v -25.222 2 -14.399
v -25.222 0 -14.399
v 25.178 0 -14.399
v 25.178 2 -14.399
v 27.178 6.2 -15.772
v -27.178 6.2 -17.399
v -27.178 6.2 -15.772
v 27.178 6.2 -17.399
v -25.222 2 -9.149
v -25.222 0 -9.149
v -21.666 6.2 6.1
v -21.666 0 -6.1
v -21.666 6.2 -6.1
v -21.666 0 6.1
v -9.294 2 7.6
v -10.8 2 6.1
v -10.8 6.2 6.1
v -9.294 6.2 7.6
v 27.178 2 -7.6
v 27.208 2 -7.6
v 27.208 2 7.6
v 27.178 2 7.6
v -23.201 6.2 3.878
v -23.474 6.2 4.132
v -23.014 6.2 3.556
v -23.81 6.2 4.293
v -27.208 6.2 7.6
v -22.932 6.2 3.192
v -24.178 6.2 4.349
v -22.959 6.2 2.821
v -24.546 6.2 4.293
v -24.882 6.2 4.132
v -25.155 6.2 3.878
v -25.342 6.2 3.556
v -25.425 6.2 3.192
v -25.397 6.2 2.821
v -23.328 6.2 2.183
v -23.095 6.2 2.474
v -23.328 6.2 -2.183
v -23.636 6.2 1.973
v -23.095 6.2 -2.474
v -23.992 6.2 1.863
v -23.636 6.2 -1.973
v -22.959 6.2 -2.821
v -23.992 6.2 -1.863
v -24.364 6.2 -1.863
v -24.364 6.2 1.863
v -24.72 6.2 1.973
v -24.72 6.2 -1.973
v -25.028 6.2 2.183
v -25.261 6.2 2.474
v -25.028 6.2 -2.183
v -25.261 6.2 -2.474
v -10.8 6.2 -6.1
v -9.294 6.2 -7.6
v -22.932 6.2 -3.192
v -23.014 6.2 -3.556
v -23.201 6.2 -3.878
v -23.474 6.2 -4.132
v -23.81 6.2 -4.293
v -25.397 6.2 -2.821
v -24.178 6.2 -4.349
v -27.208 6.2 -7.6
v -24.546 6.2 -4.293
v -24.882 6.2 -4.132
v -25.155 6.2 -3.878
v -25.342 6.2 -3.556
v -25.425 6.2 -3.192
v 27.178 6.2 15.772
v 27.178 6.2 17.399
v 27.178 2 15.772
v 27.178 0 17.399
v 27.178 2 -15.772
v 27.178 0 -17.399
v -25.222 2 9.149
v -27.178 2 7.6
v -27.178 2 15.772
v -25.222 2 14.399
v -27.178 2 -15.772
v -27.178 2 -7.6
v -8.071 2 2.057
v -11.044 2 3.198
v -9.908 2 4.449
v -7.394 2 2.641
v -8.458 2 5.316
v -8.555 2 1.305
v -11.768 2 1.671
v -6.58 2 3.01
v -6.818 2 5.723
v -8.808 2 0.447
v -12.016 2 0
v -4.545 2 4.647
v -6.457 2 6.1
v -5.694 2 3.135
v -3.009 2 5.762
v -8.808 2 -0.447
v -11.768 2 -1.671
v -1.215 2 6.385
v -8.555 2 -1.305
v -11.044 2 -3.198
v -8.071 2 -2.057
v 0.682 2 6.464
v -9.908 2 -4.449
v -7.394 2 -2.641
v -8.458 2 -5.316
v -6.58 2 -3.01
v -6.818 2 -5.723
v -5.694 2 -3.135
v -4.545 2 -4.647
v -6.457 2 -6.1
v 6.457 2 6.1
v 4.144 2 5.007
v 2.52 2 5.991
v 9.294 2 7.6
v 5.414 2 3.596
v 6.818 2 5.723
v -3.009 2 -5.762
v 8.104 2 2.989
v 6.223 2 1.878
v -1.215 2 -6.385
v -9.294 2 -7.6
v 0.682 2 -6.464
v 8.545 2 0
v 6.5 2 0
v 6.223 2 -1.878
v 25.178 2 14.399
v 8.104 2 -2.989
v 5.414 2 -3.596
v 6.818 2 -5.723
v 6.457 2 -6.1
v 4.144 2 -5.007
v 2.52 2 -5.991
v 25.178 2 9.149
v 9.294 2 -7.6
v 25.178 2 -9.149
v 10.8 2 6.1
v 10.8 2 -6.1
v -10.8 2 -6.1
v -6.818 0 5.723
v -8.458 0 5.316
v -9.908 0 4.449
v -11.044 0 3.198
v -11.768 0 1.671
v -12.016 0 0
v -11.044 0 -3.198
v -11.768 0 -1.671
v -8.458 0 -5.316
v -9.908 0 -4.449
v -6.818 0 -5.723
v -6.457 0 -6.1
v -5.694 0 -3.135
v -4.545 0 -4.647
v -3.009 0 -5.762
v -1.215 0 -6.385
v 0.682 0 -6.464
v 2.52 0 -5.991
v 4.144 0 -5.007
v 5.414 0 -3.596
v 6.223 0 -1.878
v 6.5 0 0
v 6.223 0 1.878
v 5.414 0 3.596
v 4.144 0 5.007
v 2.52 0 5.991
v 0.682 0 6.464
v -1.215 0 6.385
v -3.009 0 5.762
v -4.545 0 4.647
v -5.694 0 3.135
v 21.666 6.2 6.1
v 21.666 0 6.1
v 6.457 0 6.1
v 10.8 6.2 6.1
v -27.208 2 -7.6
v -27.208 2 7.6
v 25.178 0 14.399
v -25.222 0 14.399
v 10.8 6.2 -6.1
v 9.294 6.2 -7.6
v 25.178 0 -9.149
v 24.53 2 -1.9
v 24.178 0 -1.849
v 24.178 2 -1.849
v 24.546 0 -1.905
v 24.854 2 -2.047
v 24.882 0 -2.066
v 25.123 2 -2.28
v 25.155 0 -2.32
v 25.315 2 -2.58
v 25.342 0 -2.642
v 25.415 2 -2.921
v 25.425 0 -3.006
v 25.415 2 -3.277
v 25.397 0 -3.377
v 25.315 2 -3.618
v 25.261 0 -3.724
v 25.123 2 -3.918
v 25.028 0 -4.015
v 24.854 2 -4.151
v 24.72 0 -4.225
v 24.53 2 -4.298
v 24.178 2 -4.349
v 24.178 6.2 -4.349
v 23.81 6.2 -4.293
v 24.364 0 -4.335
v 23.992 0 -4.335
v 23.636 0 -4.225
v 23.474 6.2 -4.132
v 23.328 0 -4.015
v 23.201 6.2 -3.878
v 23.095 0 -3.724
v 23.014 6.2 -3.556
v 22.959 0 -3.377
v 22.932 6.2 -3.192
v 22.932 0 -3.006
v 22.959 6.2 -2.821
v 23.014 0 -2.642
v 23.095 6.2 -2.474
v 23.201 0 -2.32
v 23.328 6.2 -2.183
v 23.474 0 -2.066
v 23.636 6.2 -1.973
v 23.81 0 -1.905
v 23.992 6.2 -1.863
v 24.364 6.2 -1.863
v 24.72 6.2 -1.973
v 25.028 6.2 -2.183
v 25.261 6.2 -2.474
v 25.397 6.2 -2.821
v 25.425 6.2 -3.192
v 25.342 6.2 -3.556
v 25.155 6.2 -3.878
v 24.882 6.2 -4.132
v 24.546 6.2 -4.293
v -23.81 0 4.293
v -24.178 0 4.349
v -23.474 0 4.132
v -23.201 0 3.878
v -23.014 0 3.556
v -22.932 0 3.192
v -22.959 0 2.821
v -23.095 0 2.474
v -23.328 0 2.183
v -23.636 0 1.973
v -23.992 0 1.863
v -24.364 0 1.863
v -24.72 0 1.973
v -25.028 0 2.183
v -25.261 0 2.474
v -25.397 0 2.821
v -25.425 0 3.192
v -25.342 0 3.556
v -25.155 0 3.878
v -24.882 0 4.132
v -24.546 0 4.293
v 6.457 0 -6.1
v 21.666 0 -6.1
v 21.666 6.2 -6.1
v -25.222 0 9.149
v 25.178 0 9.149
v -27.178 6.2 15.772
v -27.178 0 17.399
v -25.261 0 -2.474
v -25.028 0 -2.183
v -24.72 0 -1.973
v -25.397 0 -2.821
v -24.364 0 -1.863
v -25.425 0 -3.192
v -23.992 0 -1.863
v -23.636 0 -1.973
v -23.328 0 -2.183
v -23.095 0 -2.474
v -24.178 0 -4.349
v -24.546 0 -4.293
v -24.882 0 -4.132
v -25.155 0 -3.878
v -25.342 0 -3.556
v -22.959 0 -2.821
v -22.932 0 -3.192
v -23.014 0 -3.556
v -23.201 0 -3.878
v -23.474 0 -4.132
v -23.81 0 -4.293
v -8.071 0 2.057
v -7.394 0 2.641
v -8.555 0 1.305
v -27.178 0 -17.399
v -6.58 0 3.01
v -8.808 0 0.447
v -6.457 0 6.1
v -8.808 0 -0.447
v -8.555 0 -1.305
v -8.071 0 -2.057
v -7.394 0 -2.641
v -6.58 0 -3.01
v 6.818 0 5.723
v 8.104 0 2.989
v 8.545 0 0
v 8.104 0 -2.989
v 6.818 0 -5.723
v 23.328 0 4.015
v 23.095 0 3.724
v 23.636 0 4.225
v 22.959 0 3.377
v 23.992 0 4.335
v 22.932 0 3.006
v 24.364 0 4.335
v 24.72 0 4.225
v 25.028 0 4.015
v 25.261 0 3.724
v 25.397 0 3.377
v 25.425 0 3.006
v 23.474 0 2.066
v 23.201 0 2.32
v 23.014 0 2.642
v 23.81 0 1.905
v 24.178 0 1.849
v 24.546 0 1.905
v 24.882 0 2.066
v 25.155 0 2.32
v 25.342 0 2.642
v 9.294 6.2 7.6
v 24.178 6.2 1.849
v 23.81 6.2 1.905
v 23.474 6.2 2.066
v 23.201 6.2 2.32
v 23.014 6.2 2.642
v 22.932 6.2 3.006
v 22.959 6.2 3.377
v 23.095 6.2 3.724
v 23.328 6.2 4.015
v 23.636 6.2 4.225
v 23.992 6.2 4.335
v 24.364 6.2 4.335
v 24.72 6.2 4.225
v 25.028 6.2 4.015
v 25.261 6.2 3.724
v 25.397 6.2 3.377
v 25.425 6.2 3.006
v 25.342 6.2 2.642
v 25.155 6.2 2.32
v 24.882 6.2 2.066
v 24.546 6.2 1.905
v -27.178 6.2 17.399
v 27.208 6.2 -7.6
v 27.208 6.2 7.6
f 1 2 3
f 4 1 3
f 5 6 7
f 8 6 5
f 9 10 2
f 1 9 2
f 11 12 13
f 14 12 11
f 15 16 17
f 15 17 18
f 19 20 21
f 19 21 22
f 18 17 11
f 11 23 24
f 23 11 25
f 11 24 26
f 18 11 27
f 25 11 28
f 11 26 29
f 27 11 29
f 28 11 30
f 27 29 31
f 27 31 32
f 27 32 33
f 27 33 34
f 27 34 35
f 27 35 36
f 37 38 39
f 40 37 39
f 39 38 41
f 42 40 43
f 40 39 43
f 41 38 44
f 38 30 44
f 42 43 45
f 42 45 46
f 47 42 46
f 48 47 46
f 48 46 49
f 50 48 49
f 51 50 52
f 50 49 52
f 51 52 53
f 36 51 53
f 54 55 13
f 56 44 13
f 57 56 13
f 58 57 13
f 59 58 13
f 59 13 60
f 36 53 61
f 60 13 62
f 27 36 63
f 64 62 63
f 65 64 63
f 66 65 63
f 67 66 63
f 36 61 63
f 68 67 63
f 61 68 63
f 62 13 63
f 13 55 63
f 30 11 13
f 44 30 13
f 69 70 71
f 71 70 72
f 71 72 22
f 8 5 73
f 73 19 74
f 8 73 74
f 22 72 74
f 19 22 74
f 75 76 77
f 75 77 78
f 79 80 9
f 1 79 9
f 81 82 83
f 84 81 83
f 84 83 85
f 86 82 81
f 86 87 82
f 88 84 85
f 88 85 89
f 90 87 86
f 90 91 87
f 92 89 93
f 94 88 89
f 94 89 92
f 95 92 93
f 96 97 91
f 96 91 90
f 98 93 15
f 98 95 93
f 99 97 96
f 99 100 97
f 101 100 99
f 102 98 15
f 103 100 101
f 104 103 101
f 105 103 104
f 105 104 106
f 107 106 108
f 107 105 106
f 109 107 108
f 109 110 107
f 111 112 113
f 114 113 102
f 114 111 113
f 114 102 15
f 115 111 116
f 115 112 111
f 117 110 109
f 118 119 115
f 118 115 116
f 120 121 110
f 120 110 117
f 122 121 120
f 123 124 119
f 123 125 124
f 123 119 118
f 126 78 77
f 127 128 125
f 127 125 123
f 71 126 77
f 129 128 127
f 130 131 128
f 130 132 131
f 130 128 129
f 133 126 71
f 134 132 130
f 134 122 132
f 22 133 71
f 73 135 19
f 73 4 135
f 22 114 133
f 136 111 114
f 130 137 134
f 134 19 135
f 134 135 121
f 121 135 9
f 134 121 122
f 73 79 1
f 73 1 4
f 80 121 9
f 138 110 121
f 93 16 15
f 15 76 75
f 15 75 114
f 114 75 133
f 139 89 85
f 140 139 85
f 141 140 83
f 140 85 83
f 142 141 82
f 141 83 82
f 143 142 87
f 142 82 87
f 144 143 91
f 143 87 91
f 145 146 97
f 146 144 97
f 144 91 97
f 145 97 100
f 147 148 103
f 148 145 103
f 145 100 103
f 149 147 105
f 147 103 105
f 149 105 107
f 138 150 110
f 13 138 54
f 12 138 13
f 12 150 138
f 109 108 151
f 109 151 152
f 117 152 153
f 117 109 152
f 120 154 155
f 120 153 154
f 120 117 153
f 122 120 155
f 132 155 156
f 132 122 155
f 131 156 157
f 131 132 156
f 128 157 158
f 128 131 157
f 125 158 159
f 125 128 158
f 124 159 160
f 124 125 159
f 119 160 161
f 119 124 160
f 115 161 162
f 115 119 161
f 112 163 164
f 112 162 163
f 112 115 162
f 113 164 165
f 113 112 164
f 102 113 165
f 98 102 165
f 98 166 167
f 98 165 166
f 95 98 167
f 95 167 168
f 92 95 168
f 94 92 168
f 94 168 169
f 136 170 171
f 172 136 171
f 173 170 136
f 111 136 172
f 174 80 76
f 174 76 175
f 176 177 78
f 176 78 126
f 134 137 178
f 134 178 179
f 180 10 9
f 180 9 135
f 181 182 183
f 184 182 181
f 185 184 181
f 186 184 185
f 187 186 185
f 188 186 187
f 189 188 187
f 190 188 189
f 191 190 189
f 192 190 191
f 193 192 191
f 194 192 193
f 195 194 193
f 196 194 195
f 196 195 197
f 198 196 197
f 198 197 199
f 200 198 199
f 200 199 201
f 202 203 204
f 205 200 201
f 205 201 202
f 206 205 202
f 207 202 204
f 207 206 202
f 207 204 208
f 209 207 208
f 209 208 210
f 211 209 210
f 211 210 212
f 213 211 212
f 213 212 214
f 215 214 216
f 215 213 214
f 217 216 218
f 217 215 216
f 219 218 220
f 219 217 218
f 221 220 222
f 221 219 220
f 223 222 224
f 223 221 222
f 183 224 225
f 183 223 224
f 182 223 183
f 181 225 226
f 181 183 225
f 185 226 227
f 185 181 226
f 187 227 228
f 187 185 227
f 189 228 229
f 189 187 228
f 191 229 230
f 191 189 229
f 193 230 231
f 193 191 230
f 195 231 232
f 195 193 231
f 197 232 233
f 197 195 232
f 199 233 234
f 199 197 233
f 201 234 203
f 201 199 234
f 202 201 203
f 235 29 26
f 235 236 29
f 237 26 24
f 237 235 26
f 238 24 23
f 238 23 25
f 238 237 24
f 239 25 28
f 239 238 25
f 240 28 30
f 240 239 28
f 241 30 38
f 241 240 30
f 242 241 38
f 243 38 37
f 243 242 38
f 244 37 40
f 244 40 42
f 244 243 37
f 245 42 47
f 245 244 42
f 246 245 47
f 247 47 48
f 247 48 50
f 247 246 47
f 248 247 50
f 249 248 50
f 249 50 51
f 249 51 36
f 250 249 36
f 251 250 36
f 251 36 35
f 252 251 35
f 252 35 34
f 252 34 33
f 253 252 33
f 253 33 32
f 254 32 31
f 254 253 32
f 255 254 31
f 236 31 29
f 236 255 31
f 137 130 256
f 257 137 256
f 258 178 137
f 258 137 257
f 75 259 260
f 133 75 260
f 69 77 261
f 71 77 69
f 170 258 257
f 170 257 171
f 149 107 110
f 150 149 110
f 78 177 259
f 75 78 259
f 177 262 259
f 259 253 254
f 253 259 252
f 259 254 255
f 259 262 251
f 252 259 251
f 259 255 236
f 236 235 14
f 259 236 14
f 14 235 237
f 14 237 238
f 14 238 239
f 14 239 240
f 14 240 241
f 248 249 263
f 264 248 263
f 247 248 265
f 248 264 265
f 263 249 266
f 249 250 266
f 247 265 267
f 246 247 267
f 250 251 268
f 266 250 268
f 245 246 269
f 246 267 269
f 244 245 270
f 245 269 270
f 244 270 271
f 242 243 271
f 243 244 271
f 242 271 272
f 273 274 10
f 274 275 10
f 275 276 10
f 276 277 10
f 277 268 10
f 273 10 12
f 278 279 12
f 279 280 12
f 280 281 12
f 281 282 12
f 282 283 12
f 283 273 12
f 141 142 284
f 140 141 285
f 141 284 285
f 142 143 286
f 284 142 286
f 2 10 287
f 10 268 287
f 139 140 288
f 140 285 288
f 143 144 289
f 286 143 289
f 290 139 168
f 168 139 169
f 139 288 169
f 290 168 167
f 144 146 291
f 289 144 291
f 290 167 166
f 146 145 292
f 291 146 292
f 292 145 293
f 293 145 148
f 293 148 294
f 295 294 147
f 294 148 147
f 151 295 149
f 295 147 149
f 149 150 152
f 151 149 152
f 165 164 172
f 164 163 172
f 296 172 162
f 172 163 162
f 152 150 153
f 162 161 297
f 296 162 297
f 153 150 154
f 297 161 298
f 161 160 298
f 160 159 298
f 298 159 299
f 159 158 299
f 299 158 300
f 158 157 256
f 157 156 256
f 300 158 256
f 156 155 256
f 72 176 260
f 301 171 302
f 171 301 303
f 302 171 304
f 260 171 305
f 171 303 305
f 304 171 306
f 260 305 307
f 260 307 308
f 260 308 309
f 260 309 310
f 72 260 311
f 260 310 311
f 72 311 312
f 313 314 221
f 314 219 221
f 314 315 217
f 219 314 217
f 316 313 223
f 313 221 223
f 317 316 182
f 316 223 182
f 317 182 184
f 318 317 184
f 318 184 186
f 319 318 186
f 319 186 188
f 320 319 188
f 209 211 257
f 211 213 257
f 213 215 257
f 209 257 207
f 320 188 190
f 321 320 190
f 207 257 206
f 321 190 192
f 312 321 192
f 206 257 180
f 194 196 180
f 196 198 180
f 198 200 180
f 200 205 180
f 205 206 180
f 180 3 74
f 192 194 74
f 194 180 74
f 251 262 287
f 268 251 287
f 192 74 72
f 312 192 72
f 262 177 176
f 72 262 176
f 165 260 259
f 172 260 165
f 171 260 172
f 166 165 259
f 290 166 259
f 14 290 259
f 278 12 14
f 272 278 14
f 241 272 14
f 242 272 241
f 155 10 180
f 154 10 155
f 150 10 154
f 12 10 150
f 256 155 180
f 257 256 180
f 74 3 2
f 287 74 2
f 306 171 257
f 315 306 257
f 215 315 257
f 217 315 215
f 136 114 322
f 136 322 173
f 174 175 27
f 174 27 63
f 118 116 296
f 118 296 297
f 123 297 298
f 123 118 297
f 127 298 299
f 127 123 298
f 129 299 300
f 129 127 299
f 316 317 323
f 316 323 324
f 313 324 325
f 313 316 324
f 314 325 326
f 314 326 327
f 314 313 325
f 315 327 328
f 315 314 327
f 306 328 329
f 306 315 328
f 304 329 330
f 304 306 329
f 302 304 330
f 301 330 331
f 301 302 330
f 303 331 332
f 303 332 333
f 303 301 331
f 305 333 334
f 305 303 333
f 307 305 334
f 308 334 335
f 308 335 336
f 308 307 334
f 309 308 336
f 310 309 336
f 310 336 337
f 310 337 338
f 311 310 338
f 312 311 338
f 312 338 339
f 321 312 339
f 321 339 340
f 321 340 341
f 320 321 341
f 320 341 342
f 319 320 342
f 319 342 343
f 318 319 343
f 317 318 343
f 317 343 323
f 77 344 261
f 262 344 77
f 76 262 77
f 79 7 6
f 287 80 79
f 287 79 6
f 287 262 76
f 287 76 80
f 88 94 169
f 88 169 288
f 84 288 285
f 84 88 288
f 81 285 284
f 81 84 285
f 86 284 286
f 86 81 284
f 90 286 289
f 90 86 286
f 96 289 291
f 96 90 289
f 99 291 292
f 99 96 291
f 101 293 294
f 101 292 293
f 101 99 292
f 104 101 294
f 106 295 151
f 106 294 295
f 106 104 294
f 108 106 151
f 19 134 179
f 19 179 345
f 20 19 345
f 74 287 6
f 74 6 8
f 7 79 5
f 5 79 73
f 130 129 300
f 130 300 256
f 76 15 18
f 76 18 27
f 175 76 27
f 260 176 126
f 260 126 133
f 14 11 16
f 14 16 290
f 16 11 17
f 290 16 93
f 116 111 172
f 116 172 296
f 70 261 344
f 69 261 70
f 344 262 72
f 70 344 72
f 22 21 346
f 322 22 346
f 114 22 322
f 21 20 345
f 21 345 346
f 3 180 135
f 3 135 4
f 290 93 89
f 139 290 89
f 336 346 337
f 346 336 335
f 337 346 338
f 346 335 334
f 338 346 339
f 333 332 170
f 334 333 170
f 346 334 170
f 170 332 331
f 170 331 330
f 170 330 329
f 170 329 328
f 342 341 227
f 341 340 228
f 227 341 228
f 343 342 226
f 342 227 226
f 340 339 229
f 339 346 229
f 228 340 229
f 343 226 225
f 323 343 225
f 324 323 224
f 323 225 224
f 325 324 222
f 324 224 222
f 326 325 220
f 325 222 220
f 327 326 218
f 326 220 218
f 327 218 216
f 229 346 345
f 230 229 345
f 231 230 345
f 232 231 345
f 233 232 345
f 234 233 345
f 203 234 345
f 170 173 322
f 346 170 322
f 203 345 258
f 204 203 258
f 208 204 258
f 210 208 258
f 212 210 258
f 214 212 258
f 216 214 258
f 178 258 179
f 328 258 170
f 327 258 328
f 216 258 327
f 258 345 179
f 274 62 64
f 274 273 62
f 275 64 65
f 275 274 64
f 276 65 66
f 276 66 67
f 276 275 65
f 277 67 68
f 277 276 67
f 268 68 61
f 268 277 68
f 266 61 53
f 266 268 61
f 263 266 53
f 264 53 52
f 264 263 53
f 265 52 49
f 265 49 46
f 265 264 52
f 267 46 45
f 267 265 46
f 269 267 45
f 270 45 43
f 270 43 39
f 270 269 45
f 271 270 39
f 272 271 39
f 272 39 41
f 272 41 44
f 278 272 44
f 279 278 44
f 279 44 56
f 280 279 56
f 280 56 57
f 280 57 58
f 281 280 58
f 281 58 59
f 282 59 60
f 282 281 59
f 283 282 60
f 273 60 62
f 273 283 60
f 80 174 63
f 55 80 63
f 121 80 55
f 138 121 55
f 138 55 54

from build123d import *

# Parameters (mm, degrees)
SKETCH1_W               = 54.356
SKETCH1_H               = 34.798
SKETCH1_R               = 1.250004527
SKETCH1_W_2             = 50.4000008
SKETCH1_H_2             = 5.2500022
BOSS_EXTRUDE1_DEPTH     = 1.999996
SKETCH2_W               = 54.356
SKETCH2_H               = 1.626997
BOSS_EXTRUDE2_DEPTH     = 4.1999916
SKETCH3_R               = 1.250004527
BOSS_EXTRUDE3_DEPTH     = 4.1999916
CUT_EXTRUDE1_DEPTH      = 33.88498208
CUT_EXTRUDE1_DEPTH_BACK = 33.88498208


with BuildPart() as part:
    # Sketch1 → Boss-Extrude1 (new body)
    with BuildSketch(Plane(origin=(0, 0, 0), x_dir=(1, 0, 0), z_dir=(0, 1, 0))):
        Rectangle(SKETCH1_W, SKETCH1_H)
        with Locations(Location((24.178011673, 3.099006966, 0), (0, 0, 270))):
            Circle(SKETCH1_R, mode=Mode.SUBTRACT)
        with Locations(Location((24.178011673, -3.099006966, 0), (0, 0, 90))):
            Circle(SKETCH1_R, mode=Mode.SUBTRACT)
        with Locations(Location((-24.178011673, -3.099006966, 0), (0, 0, 270))):
            Circle(SKETCH1_R, mode=Mode.SUBTRACT)
        with Locations(Location((-24.178011673, 3.099006966, 0), (0, 0, 90))):
            Circle(SKETCH1_R, mode=Mode.SUBTRACT)
        with Locations((-0.0219964, 11.7740049)):
            Rectangle(SKETCH1_W_2, SKETCH1_H_2, mode=Mode.SUBTRACT)
        with Locations((-0.0219964, -11.7740049)):
            Rectangle(SKETCH1_W_2, SKETCH1_H_2, mode=Mode.SUBTRACT)
    extrude(amount=BOSS_EXTRUDE1_DEPTH)

    # Sketch2 → Boss-Extrude2 (add)
    with BuildSketch(Plane(origin=(0, 1.999996, 0), x_dir=(1, 0, 0), z_dir=(0, 1, 0))):
        with Locations((0, 16.5855015)):
            Rectangle(SKETCH2_W, SKETCH2_H)
        with Locations((0, -16.5855015)):
            Rectangle(SKETCH2_W, SKETCH2_H)
    extrude(amount=BOSS_EXTRUDE2_DEPTH)

    # Sketch3 → Boss-Extrude3 (add)
    # profile 1 of 2: a face of its own
    with BuildSketch(Plane(origin=(0, 1.999996, 0), x_dir=(1, 0, 0), z_dir=(0, 1, 0))):
        Polygon((-27.207664346, 7.5999975), (-9.294212746, 7.5999975), (-10.799929046, 6.1000005), (-21.665998246, 6.1000005), (-21.665998246, -6.1000005), (-10.799929046, -6.1000005), (-9.294212746, -7.5999975), (-27.207664346, -7.5999975), align=None)
        with Locations(Location((-24.178011673, -3.099006966, 0), (0, 0, 270))):
            Circle(SKETCH3_R, mode=Mode.SUBTRACT)
        with Locations(Location((-24.178011673, 3.099006966, 0), (0, 0, 90))):
            Circle(SKETCH3_R, mode=Mode.SUBTRACT)
    # profile 2 of 2: a face of its own
    with BuildSketch(Plane(origin=(0, 1.999996, 0), x_dir=(1, 0, 0), z_dir=(0, 1, 0))):
        Polygon((27.207664346, -7.5999975), (9.294212746, -7.5999975), (10.799929046, -6.1000005), (21.665998246, -6.1000005), (21.665998246, 6.1000005), (10.799929046, 6.1000005), (9.294212746, 7.5999975), (27.207664346, 7.5999975), align=None)
        with Locations(Location((24.178011673, 3.099006966, 0), (0, 0, 90))):
            Circle(SKETCH3_R, mode=Mode.SUBTRACT)
        with Locations(Location((24.178011673, -3.099006966, 0), (0, 0, 90))):
            Circle(SKETCH3_R, mode=Mode.SUBTRACT)
    extrude(amount=BOSS_EXTRUDE3_DEPTH)

    # Sketch4 → Cut-Extrude1 (cut, two sides: drawn at the far end of the back side and taken through both)
    with BuildSketch(Plane.XZ.offset(-CUT_EXTRUDE1_DEPTH_BACK)):
        with BuildLine():
            ThreePointArc((-5.694081512, -3.1348976), (6.500011325, 0), (-5.694081512, 3.1348976))
            ThreePointArc((-5.694081512, 3.1348976), (-8.840003041, 0), (-5.694081512, -3.1348976))
        make_face()
        with BuildLine():
            ThreePointArc((-6.817717046, 5.7234709), (-12.015990113, 0), (-6.817717046, -5.7234709))
            Line((-6.817717046, -5.7234709), (-6.457037046, -6.1000005))
            Line((-6.457037046, -6.1000005), (-10.799929046, -6.1000005))
            Line((-10.799929046, -6.1000005), (-21.665998246, -6.1000005))
            Line((-21.665998246, -6.1000005), (-21.665998246, 6.1000005))
            Line((-21.665998246, 6.1000005), (-10.799929046, 6.1000005))
            Line((-10.799929046, 6.1000005), (-6.457037046, 6.1000005))
            Line((-6.457037046, 6.1000005), (-6.817717046, 5.7234709))
        make_face()
        with BuildLine():
            Line((6.457037046, 6.1000005), (6.817717046, 5.7234709))
            ThreePointArc((6.817717046, 5.7234709), (8.544974069, 0), (6.817717046, -5.7234709))
            Line((6.817717046, -5.7234709), (6.457037046, -6.1000005))
            Line((6.457037046, -6.1000005), (10.799929046, -6.1000005))
            Line((10.799929046, -6.1000005), (21.665998246, -6.1000005))
            Line((21.665998246, -6.1000005), (21.665998246, 6.1000005))
            Line((21.665998246, 6.1000005), (10.799929046, 6.1000005))
            Line((10.799929046, 6.1000005), (6.457037046, 6.1000005))
        make_face()
    extrude(amount=CUT_EXTRUDE1_DEPTH + CUT_EXTRUDE1_DEPTH_BACK, mode=Mode.SUBTRACT)


solid = part.part
